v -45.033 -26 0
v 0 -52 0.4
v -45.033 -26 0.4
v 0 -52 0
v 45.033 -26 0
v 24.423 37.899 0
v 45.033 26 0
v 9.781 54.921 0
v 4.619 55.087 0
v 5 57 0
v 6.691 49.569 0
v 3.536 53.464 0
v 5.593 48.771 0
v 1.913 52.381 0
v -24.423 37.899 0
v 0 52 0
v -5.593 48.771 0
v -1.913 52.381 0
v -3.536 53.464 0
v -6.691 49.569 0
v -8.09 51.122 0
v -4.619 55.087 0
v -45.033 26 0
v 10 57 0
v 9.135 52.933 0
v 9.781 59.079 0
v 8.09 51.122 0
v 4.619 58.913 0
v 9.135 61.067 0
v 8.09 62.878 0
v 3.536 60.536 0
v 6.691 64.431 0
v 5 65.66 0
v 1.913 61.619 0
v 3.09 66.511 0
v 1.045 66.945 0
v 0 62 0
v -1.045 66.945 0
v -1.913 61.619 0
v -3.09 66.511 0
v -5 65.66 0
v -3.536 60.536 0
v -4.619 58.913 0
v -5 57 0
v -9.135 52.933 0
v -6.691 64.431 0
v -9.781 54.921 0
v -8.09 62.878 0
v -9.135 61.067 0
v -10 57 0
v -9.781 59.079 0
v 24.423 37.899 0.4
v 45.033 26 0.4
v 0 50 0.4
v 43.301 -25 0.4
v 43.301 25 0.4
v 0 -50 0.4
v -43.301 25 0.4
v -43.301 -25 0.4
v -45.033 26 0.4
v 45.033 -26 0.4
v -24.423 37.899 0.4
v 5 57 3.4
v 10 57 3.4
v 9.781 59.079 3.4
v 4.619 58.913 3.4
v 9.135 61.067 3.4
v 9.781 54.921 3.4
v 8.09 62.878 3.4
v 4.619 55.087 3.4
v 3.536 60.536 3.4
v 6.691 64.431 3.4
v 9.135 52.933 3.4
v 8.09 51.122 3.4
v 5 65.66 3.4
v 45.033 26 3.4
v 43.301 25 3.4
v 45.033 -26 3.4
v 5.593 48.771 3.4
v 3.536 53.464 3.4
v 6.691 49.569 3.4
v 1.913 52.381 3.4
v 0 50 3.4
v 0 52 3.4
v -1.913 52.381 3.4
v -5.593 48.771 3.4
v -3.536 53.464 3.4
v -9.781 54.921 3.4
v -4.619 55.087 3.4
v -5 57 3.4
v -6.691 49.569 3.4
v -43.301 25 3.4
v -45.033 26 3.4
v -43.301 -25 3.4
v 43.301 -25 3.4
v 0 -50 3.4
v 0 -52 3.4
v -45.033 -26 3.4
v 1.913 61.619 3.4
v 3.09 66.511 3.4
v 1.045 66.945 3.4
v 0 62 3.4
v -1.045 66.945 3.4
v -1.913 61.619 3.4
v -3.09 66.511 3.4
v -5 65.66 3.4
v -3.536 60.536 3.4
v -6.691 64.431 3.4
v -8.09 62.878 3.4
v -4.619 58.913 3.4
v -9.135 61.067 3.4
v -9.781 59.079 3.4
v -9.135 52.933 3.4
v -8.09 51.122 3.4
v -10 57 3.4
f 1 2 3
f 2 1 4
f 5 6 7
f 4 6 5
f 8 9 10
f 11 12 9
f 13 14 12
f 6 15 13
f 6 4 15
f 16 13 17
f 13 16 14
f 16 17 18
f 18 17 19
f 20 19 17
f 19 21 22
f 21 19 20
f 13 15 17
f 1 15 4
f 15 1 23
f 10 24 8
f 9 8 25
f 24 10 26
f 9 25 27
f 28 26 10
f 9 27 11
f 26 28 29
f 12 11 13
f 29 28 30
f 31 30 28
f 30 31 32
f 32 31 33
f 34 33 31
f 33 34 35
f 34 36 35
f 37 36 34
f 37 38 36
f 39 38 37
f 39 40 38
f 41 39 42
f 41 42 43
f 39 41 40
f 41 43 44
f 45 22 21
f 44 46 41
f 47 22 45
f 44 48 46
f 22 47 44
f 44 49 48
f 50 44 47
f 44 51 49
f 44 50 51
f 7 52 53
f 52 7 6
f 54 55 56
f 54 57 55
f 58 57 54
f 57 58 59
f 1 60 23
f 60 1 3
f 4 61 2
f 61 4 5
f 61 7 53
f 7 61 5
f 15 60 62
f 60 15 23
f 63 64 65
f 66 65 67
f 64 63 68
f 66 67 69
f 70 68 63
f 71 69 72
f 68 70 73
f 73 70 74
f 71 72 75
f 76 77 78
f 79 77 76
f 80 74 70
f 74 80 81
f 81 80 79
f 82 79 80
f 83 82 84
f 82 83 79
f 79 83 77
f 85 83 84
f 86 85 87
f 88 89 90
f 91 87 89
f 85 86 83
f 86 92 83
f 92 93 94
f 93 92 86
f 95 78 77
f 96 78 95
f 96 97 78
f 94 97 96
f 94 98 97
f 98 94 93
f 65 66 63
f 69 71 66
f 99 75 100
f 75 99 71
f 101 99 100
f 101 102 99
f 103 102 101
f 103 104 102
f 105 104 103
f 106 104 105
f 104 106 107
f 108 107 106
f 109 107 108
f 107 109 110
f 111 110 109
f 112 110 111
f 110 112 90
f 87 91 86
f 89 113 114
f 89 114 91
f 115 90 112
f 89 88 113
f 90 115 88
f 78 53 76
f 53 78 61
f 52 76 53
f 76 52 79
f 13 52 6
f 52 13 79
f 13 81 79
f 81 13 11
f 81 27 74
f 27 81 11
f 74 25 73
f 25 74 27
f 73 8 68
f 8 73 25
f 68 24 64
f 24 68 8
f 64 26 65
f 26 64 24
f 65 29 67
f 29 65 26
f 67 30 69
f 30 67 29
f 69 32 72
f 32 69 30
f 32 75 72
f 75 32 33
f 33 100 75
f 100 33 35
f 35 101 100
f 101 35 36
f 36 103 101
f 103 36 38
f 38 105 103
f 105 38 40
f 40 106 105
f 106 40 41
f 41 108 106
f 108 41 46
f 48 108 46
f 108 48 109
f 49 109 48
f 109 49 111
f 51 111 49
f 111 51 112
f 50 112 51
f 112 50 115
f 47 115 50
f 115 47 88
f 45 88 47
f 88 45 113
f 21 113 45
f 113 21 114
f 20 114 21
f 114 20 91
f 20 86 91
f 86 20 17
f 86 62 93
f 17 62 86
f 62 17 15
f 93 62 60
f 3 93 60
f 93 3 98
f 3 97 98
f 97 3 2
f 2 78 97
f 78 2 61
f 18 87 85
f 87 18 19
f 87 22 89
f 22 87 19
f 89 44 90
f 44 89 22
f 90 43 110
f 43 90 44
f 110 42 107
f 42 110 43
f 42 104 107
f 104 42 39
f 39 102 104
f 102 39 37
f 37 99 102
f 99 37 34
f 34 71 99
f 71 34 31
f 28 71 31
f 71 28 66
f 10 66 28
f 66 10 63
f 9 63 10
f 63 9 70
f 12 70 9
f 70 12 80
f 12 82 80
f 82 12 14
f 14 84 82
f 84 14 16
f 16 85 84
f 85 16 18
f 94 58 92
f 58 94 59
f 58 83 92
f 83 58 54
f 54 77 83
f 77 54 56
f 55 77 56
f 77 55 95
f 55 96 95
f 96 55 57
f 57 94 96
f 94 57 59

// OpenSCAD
// preview[view:south, tilt:top]

// Lithophane V2 with different frame types
// Original script made by Makerbot (http://www.thingiverse.com/thing:74322)
// Modified by Carlosgs (http://carlosgs.es)


/* [Image] */

// Load a 150x150 pixel image.(images will be stretched to fit) Simple photos work best. Don't forget to click the Invert Colors checkbox!
image_file = "image-surface.dat"; // [image_surface:150x150]

/* [Adjustments] */

hole_diameter = 10;

image_angle = 0; // [0:360]

frame_side_number = 6; // [3:50]

// What layer height will you slice this at?  The thinner the better.
layer_height = 0.2;

// The lower the layer height, the more layers you can use.
number_of_layers = 15; // [5:20]

/* [Hidden] */

length = 100;
width = 100;
// base (white) will always be 2 layers thick
min_layer_height = layer_height*2;
hole_radius = hole_diameter/2;
height = layer_height*number_of_layers;

union() {
  // take just the part of surface we want
intersection() {
  difference() {
    rotate([0,0,image_angle]) translate([0, 0, min_layer_height]) scale([100/150,100/150,height]) surface(file=image_file, center=true, convexity=5);
    translate([0,0,-(height+min_layer_height)]) linear_extrude(height=height+min_layer_height) square([length, width], center=true);
  }
    rotate([0,0,90])
      cylinder(r=length/2,h=height*2,$fn=frame_side_number);
}
  //linear_extrude(height=layer_height*2) square([length+4, width+4], center=true);
  linear_extrude(height=layer_height*2)
    rotate([0,0,90])
      circle(r=(length+4)/2, center=true, $fn=frame_side_number);

  linear_extrude(height=height+min_layer_height){
	  difference(){
		union(){
	     rotate([0,0,90])
          circle(r=(length+4)/2, center=true, $fn=frame_side_number);
		  translate([0, width/2+hole_radius+2, 0])
		    circle(r=hole_radius+5);
		}
	    union(){
	     rotate([0,0,90])
          circle(r=length/2, center=true, $fn=frame_side_number);
		  translate([0, width/2+hole_radius+2, 0])
	        circle(r=hole_radius);
	    }
	  }
  }
}
